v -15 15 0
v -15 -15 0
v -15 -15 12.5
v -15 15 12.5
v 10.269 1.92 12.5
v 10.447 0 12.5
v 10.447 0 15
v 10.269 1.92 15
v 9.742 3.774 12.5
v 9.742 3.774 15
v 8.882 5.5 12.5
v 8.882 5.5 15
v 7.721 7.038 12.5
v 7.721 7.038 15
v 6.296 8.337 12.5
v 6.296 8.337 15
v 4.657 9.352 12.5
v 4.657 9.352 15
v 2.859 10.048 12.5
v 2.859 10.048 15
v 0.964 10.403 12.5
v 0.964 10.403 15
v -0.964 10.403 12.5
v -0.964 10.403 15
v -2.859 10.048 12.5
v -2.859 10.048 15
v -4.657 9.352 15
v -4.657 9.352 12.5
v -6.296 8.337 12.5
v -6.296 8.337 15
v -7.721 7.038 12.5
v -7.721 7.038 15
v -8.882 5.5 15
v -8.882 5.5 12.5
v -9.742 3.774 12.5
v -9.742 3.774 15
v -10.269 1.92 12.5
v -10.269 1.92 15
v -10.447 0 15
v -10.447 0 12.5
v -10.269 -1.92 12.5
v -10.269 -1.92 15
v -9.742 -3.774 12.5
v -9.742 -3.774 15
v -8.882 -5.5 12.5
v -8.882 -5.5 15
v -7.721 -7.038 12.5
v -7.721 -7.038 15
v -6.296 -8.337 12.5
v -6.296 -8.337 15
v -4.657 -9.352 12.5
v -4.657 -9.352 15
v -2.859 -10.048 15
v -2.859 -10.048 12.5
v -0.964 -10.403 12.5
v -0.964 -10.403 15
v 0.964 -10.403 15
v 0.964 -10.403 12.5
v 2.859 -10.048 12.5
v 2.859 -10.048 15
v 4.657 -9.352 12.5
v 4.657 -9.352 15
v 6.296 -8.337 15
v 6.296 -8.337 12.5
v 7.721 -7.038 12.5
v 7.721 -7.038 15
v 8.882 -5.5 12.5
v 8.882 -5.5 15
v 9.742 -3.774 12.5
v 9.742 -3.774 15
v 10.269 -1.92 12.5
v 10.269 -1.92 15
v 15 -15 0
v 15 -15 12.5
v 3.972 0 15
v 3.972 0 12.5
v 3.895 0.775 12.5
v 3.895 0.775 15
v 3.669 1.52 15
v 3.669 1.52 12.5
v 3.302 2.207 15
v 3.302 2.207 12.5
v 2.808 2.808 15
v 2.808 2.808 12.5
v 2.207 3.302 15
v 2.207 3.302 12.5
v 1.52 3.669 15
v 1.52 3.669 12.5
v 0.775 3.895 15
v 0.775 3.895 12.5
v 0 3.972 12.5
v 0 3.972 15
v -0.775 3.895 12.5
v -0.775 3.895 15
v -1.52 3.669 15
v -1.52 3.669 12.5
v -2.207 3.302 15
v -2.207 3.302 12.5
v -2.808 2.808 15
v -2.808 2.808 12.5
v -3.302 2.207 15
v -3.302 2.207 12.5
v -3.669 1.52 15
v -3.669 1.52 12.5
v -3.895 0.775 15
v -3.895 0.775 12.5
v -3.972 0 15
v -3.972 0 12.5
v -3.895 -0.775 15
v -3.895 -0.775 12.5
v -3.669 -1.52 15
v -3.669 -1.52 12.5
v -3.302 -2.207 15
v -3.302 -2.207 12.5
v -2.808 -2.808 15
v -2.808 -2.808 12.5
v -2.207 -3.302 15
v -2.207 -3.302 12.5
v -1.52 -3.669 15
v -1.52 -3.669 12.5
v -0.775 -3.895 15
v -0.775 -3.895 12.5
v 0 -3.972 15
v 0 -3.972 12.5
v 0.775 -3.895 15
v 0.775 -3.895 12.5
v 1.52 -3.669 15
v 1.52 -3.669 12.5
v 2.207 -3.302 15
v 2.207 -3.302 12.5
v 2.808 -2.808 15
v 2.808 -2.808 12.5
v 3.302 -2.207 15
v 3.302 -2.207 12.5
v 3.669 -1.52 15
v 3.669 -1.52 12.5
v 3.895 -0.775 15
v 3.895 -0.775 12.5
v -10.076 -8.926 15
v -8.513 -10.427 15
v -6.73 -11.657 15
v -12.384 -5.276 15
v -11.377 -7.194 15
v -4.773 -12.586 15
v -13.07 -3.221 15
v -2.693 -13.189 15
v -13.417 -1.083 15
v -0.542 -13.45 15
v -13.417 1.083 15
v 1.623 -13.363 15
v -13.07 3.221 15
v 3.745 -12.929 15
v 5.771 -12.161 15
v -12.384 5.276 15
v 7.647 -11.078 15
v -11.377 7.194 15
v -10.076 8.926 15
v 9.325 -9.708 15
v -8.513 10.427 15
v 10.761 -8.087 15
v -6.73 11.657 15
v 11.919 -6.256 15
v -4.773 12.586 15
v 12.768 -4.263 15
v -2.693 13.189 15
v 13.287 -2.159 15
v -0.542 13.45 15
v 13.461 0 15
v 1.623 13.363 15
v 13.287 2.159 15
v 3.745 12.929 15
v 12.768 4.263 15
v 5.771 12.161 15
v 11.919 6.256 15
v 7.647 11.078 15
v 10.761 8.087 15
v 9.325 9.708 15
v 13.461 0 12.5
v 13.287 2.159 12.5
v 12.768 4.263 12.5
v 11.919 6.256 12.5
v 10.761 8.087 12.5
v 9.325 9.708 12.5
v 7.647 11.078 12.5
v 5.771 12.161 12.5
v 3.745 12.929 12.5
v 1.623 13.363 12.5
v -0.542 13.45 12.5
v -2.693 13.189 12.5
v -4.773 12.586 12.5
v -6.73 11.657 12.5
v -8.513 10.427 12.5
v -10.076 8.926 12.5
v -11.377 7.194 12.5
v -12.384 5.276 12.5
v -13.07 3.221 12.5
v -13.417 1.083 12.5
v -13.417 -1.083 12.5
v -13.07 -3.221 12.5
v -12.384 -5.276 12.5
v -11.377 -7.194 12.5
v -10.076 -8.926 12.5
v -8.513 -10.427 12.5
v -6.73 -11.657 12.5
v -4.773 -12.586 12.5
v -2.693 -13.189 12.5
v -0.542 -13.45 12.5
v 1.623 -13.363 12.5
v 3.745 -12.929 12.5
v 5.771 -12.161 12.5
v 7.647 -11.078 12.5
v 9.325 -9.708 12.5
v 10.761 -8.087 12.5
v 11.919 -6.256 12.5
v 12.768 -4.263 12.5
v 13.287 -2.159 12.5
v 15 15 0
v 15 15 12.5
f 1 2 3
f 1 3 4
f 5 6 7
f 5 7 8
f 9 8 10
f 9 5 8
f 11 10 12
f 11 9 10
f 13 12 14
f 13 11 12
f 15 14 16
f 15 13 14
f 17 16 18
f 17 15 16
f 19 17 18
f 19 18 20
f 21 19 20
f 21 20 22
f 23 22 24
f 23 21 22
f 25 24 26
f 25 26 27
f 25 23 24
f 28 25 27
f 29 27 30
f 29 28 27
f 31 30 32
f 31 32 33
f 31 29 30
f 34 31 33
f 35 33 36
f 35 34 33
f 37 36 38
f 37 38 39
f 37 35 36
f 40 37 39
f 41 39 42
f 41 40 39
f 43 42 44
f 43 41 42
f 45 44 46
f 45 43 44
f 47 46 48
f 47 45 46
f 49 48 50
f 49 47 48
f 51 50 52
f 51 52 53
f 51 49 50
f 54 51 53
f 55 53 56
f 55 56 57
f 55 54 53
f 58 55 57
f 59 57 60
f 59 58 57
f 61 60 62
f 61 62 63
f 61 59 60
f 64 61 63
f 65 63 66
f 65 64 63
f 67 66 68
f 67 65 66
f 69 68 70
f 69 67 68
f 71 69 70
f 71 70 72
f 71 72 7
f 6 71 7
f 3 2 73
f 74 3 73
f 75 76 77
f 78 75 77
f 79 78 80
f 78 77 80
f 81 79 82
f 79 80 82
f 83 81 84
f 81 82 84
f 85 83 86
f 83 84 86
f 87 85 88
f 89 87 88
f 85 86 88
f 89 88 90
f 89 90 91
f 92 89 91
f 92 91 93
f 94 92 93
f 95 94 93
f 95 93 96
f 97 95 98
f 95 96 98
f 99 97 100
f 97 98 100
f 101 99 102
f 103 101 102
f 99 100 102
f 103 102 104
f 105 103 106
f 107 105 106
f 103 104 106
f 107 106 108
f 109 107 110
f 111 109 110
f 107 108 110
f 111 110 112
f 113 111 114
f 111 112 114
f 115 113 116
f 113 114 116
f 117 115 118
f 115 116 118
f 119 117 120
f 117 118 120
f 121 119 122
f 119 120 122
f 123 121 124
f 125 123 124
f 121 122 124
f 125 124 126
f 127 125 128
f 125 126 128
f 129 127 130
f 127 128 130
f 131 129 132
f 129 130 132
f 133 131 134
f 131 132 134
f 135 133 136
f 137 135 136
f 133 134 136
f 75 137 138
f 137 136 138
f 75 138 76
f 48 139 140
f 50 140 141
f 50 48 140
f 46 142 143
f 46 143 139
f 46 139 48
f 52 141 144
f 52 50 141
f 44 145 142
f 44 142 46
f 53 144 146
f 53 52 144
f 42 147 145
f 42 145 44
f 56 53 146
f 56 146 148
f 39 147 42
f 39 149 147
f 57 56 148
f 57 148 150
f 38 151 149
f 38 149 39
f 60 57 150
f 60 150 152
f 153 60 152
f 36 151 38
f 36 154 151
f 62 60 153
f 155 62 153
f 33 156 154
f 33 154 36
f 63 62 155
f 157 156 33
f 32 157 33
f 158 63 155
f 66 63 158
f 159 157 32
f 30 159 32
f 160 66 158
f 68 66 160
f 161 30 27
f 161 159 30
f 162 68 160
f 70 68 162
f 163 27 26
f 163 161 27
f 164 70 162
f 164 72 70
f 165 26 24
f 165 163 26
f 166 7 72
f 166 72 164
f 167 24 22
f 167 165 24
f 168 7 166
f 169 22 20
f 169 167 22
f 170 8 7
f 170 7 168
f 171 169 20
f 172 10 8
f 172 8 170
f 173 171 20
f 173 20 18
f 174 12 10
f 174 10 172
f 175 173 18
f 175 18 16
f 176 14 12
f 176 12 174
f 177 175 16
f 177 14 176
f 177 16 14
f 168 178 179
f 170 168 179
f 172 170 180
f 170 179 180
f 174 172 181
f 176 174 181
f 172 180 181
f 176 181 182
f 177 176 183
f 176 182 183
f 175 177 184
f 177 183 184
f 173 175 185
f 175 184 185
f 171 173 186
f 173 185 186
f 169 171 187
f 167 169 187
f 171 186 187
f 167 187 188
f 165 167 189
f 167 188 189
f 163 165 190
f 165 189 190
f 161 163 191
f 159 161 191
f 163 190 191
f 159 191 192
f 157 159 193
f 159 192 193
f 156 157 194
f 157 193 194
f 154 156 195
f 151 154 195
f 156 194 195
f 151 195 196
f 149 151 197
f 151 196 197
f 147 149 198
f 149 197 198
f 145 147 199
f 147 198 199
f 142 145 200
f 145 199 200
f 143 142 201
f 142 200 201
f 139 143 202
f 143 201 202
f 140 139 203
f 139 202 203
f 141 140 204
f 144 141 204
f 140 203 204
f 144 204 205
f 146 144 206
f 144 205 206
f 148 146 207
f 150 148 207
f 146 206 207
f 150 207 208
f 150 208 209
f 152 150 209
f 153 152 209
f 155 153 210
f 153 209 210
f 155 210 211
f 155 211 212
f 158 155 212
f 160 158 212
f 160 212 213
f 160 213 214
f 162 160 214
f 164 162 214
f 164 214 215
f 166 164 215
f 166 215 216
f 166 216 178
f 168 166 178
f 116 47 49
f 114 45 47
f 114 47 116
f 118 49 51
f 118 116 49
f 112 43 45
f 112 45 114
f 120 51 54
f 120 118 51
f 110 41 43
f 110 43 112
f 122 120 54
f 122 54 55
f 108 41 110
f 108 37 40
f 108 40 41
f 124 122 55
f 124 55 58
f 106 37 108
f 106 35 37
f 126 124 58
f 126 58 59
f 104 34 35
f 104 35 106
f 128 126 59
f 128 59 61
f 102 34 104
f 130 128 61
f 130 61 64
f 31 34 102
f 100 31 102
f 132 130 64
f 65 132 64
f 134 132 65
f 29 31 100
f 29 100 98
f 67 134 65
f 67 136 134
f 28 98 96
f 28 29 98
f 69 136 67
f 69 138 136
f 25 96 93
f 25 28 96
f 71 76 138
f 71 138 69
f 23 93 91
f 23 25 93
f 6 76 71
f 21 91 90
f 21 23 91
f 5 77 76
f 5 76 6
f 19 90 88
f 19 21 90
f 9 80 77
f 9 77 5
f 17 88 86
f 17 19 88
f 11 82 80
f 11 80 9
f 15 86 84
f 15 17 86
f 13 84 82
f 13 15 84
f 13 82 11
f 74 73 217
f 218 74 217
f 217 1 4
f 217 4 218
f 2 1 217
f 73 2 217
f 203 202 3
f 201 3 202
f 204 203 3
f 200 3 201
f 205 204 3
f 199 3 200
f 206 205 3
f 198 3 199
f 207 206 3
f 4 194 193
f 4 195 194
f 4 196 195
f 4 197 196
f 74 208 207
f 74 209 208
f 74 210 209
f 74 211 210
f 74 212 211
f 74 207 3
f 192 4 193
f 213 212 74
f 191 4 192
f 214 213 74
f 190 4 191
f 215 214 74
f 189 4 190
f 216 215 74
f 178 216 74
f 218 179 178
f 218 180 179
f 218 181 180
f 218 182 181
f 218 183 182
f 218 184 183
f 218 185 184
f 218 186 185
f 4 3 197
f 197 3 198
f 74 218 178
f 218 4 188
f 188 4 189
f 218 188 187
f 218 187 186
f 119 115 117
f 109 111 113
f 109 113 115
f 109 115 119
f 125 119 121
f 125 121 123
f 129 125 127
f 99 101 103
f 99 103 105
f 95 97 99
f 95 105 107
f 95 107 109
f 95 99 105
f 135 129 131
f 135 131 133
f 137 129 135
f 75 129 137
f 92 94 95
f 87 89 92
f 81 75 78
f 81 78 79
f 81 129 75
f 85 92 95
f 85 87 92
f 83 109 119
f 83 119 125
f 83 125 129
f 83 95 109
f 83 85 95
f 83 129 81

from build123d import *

# Parameters (mm, degrees)
F0_W     = 30
F0_H     = 30
F1_DEPTH = 12.5
F3_R     = 13.460872
F3_R_2   = 10.447171
F4_DEPTH = 2.5
F2_R     = 3.97173
F5_DEPTH = 2.5


with BuildPart() as f1:
    # F0 (on Top) → F1 (new body)
    with BuildSketch(Plane.XY):
        Rectangle(F0_W, F0_H)
    extrude(amount=F1_DEPTH)

    # F3 (on face) → F4 (join)
    with BuildSketch(Plane.XY.offset(12.5)):
        Circle(F3_R)
        Circle(F3_R_2, mode=Mode.SUBTRACT)
    extrude(amount=F4_DEPTH)

    # F2 (on face) → F5 (join)
    with BuildSketch(Plane.XY.offset(12.5)):
        Circle(F2_R)
    extrude(amount=F5_DEPTH)


solid = f1.part
